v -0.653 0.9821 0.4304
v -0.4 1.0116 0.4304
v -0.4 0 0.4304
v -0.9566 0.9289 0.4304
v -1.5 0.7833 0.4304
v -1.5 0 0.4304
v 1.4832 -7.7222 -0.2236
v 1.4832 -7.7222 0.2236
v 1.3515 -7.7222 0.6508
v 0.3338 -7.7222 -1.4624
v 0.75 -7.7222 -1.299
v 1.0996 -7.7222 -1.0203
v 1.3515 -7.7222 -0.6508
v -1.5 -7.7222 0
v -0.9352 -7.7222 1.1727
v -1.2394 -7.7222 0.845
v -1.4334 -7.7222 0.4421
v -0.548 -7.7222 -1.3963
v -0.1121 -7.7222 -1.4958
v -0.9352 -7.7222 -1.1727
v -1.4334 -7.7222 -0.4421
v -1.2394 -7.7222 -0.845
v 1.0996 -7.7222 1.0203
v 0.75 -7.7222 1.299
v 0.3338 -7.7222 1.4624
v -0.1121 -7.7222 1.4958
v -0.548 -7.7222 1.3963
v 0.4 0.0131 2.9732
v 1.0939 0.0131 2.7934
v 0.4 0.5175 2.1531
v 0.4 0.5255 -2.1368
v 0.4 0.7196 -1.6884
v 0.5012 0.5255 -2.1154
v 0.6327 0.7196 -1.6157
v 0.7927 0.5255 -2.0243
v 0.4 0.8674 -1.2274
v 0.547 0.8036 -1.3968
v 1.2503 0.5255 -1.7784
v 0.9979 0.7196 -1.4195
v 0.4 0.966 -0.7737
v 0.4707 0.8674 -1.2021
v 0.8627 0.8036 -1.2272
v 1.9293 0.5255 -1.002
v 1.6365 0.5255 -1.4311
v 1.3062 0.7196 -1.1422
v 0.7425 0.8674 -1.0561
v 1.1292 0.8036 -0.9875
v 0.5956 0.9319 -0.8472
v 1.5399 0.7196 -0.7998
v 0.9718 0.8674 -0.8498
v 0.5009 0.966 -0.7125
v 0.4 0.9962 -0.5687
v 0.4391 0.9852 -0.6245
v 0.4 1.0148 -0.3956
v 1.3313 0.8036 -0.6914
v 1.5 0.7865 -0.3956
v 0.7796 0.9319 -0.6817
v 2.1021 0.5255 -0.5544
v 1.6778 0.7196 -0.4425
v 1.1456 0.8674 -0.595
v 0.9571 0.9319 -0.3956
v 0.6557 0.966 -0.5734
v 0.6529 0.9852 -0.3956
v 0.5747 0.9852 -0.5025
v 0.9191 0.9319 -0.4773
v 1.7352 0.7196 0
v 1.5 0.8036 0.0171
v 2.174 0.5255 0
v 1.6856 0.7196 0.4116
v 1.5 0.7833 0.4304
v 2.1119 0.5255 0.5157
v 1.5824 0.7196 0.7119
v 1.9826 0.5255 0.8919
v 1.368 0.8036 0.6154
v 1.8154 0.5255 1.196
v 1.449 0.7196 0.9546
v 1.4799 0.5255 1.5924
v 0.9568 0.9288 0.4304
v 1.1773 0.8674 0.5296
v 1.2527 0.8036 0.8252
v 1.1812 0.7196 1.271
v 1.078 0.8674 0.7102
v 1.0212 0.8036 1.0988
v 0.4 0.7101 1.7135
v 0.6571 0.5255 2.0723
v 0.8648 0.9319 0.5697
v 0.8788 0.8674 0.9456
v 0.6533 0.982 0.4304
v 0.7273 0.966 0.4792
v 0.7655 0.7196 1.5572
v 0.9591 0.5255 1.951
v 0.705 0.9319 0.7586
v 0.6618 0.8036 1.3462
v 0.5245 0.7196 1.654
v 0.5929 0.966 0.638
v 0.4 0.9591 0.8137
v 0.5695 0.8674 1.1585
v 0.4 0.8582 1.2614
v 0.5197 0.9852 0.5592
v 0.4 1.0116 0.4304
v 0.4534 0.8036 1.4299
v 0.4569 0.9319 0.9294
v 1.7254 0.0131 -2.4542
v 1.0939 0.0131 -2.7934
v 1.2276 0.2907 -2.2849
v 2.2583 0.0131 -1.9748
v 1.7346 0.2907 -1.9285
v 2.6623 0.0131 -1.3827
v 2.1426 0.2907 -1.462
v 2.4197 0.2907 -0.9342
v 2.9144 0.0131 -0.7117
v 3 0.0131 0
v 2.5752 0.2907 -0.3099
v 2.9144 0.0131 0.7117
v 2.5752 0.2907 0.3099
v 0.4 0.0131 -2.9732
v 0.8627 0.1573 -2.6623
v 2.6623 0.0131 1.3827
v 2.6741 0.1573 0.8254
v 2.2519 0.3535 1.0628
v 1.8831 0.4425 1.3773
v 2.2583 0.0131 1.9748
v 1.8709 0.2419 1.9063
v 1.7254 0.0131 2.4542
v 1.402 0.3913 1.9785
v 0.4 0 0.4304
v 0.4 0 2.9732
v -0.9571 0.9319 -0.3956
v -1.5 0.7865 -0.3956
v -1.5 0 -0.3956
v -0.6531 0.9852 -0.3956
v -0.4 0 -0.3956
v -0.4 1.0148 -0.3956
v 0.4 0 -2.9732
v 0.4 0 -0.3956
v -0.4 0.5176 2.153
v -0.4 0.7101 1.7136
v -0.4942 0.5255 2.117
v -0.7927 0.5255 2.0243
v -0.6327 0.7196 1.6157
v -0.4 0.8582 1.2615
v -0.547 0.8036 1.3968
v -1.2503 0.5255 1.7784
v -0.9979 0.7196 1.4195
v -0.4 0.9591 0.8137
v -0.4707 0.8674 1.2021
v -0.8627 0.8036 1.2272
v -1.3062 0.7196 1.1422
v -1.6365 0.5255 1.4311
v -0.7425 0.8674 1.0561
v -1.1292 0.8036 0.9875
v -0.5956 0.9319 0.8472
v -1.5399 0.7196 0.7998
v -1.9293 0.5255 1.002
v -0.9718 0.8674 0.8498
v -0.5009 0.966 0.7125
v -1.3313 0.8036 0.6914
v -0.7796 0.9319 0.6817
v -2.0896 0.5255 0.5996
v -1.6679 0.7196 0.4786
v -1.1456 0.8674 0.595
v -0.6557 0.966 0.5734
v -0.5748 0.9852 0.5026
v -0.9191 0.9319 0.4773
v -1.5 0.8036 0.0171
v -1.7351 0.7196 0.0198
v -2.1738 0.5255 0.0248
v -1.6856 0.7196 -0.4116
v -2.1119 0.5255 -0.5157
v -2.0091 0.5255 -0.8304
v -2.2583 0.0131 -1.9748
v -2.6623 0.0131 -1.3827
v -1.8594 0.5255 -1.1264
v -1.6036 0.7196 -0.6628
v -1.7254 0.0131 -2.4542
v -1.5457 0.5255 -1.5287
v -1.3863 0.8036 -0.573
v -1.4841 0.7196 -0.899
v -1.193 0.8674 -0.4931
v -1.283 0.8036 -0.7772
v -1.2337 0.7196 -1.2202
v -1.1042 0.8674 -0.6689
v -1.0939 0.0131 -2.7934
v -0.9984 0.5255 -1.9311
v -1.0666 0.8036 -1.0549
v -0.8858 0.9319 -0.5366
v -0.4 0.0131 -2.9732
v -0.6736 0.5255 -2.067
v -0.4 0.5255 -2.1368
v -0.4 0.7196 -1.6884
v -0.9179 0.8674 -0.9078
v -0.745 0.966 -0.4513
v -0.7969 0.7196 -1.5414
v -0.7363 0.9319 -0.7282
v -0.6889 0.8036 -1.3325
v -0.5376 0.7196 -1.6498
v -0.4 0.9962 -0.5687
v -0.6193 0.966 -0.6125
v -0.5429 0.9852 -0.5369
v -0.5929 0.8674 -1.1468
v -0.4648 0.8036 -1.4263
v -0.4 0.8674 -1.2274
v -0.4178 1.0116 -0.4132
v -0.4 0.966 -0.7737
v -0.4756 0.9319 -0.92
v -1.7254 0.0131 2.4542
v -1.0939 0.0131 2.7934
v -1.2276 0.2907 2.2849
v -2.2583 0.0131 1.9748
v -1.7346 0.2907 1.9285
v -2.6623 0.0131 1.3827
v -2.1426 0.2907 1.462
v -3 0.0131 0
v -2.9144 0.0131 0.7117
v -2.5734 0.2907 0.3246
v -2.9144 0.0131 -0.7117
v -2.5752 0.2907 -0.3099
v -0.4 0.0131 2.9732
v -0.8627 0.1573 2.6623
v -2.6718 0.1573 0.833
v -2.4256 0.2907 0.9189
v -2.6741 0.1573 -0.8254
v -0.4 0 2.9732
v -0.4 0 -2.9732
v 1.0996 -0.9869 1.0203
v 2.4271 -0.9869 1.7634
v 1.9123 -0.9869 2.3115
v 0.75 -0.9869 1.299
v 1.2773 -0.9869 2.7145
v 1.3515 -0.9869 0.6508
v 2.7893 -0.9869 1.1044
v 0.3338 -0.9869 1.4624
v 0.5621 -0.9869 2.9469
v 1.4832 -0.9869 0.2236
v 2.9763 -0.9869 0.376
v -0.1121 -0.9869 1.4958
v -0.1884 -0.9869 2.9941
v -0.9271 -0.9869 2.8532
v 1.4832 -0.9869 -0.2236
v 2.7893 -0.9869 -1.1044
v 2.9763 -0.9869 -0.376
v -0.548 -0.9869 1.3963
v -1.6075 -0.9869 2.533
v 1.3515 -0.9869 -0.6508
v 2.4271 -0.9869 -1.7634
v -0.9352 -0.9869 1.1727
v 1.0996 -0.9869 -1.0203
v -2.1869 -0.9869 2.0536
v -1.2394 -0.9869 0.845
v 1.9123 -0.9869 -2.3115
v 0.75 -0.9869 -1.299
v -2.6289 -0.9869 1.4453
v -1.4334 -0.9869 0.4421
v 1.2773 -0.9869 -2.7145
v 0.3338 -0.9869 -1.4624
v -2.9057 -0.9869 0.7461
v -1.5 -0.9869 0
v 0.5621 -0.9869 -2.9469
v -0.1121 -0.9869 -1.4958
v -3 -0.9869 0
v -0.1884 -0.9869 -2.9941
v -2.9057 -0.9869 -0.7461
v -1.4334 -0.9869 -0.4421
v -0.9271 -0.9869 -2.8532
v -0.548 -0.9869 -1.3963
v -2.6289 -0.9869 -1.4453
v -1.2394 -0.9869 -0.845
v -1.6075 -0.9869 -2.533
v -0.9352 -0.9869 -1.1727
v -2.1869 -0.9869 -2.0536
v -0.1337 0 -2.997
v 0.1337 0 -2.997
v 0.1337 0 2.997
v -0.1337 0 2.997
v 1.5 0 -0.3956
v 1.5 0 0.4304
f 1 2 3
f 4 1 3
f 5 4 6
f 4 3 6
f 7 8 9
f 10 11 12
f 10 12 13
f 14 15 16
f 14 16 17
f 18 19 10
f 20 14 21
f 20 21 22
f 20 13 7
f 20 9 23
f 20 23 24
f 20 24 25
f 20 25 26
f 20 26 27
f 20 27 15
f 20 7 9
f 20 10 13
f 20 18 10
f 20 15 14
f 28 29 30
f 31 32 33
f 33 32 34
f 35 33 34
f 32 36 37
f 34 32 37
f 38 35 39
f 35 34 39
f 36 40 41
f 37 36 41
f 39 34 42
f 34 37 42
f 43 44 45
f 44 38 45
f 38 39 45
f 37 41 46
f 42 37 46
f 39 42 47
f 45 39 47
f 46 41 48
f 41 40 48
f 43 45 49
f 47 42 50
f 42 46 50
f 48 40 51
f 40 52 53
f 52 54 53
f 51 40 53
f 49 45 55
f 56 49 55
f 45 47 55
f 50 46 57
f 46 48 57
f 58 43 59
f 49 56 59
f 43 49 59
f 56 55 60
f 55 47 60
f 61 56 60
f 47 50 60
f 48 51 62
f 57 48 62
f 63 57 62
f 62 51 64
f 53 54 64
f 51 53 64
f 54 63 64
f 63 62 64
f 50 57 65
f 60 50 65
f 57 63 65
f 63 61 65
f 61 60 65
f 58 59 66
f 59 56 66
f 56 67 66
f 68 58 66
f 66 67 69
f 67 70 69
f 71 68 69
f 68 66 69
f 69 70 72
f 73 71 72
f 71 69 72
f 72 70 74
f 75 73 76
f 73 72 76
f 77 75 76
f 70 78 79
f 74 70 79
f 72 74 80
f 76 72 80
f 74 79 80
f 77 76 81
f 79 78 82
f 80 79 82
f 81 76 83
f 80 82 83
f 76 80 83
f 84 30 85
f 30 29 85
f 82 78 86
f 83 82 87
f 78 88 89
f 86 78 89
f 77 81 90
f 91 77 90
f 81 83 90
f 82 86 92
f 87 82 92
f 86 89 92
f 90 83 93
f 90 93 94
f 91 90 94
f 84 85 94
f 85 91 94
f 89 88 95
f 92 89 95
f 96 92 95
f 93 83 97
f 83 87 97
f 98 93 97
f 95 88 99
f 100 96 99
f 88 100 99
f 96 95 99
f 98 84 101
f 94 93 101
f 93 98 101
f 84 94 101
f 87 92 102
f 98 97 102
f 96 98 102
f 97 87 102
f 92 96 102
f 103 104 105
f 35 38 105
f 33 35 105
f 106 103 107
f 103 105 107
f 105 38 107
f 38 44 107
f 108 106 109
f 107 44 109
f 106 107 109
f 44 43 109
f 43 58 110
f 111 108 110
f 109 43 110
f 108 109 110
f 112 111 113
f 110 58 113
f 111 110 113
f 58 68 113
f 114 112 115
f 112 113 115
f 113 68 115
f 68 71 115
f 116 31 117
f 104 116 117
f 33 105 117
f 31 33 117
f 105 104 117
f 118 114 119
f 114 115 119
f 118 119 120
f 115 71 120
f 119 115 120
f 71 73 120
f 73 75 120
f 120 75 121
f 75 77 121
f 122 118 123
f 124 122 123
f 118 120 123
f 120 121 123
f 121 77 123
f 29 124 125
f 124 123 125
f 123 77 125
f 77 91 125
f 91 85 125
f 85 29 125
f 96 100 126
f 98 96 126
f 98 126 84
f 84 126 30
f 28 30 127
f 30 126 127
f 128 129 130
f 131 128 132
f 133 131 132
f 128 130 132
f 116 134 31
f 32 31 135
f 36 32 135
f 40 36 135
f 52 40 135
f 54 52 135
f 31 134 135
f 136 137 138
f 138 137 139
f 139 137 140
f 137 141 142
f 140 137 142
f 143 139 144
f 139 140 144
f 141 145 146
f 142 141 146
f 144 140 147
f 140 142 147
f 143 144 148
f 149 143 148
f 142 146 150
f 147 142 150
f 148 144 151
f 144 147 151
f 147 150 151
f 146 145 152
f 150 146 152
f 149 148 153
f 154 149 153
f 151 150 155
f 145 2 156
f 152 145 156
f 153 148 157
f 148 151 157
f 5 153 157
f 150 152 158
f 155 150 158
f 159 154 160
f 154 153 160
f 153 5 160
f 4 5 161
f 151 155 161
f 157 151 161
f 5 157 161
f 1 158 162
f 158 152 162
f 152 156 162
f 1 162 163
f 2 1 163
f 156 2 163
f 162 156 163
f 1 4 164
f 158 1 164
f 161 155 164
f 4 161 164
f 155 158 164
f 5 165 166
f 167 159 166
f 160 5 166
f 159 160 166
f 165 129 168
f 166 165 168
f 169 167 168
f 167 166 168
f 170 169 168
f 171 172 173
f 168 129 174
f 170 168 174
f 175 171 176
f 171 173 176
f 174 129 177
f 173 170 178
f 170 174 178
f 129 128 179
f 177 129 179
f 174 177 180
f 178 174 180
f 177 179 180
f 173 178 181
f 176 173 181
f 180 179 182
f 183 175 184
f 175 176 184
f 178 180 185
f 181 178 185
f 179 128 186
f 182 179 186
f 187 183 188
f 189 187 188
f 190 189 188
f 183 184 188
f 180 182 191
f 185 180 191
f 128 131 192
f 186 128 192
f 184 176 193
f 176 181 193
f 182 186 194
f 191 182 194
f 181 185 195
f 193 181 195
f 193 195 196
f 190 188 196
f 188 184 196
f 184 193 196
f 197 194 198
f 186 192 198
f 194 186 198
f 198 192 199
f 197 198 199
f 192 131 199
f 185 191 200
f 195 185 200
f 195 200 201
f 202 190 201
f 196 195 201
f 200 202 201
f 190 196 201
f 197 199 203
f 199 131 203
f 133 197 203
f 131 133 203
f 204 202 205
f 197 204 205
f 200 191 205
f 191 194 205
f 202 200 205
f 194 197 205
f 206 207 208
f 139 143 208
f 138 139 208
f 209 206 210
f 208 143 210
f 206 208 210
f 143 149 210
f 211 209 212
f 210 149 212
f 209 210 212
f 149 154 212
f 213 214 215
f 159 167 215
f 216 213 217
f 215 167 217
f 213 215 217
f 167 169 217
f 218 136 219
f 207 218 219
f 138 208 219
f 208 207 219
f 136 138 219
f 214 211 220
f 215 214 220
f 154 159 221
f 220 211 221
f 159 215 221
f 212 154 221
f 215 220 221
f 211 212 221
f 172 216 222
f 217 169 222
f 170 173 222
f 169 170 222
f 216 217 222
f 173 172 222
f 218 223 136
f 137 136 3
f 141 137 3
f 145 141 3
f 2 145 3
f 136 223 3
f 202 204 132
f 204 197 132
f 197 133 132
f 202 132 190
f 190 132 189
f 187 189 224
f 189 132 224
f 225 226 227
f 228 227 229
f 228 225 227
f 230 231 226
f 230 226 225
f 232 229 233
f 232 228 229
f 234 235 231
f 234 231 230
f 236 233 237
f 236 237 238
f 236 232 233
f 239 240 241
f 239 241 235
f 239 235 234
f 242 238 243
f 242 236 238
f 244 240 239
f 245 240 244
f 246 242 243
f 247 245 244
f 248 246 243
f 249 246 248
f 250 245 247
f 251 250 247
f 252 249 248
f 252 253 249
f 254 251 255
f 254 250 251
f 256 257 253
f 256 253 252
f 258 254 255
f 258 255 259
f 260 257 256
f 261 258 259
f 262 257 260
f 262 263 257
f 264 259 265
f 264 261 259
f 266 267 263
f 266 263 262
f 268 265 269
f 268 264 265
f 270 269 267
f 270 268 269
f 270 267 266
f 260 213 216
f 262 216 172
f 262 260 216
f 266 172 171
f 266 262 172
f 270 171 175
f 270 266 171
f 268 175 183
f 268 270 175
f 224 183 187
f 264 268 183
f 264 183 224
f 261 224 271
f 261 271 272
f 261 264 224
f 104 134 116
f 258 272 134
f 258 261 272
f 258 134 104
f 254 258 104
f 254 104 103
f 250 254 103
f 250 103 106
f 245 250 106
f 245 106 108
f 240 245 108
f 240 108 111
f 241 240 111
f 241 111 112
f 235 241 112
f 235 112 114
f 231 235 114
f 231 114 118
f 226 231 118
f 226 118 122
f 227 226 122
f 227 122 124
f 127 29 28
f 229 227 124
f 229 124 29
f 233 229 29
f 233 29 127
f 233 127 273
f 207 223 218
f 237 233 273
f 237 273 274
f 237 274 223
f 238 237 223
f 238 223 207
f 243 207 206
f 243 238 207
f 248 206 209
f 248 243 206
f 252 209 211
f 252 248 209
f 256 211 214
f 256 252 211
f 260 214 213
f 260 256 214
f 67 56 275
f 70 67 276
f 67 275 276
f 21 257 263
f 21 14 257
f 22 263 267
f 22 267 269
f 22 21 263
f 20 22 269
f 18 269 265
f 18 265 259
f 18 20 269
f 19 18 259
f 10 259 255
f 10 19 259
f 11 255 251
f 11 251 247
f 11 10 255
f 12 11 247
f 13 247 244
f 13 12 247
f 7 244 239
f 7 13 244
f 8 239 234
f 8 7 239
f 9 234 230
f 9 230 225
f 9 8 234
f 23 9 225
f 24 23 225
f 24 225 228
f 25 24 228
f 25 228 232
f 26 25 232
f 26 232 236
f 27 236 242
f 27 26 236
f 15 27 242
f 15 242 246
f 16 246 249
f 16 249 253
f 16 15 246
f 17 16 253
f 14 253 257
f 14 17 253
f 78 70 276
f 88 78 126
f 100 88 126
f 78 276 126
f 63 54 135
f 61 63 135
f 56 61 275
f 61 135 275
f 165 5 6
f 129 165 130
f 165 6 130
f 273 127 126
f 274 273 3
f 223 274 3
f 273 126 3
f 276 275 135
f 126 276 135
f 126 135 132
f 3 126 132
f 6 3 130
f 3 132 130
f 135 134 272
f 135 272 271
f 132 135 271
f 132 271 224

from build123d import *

# Parameters (mm, degrees)
SCHNITT_LINEAR_AUSTRAGEN1_DEPTH = 2.056247308


with BuildPart() as part:
    # Skizze1 → Rotation1 (revolve)
    with BuildSketch(Plane.XY):
        with BuildLine():
            Line((-3, -0.986868648), (-1.5, -0.986868648))
            Line((-1.5, -0.986868648), (-1.5, -7.722161257))
            Line((-1.5, -7.722161257), (0, -7.722161257))
            Line((0, -7.722161257), (0, 1.056247208))
            add(Edge.make_bspline(
                [(-3, 0.013131352), (-1.65504596, 1.020141519), (0, 1.056247208)],
                knots=[0, 0, 0, 0.690587557, 0.690587557, 0.690587557], degree=2))
            Line((-3, 0.013131352), (-3, -0.986868648))
        make_face()
    revolve(axis=Axis((0, 54.476945253, 0), (0, -1, 0)))

    # Skizze2 → Schnitt-Linear austragen1 (cut, through all)
    with BuildSketch(Plane(origin=(0, 0, 0), x_dir=(1, 0, 0), z_dir=(0, 1, 0))):
        Polygon((-0.4, 3.573663987), (0.4, 3.573663987), (0.4, 0.395605851), (1.5, 0.395605851), (1.5, -0.43040926), (0.4, -0.43040926), (0.4, -3.41246381), (-0.4, -3.41246381), (-0.4, -0.43040926), (-1.5, -0.43040926), (-1.5, 0.395605851), (-0.4, 0.395605851), align=None)
    extrude(amount=SCHNITT_LINEAR_AUSTRAGEN1_DEPTH, mode=Mode.SUBTRACT)


solid = part.part
